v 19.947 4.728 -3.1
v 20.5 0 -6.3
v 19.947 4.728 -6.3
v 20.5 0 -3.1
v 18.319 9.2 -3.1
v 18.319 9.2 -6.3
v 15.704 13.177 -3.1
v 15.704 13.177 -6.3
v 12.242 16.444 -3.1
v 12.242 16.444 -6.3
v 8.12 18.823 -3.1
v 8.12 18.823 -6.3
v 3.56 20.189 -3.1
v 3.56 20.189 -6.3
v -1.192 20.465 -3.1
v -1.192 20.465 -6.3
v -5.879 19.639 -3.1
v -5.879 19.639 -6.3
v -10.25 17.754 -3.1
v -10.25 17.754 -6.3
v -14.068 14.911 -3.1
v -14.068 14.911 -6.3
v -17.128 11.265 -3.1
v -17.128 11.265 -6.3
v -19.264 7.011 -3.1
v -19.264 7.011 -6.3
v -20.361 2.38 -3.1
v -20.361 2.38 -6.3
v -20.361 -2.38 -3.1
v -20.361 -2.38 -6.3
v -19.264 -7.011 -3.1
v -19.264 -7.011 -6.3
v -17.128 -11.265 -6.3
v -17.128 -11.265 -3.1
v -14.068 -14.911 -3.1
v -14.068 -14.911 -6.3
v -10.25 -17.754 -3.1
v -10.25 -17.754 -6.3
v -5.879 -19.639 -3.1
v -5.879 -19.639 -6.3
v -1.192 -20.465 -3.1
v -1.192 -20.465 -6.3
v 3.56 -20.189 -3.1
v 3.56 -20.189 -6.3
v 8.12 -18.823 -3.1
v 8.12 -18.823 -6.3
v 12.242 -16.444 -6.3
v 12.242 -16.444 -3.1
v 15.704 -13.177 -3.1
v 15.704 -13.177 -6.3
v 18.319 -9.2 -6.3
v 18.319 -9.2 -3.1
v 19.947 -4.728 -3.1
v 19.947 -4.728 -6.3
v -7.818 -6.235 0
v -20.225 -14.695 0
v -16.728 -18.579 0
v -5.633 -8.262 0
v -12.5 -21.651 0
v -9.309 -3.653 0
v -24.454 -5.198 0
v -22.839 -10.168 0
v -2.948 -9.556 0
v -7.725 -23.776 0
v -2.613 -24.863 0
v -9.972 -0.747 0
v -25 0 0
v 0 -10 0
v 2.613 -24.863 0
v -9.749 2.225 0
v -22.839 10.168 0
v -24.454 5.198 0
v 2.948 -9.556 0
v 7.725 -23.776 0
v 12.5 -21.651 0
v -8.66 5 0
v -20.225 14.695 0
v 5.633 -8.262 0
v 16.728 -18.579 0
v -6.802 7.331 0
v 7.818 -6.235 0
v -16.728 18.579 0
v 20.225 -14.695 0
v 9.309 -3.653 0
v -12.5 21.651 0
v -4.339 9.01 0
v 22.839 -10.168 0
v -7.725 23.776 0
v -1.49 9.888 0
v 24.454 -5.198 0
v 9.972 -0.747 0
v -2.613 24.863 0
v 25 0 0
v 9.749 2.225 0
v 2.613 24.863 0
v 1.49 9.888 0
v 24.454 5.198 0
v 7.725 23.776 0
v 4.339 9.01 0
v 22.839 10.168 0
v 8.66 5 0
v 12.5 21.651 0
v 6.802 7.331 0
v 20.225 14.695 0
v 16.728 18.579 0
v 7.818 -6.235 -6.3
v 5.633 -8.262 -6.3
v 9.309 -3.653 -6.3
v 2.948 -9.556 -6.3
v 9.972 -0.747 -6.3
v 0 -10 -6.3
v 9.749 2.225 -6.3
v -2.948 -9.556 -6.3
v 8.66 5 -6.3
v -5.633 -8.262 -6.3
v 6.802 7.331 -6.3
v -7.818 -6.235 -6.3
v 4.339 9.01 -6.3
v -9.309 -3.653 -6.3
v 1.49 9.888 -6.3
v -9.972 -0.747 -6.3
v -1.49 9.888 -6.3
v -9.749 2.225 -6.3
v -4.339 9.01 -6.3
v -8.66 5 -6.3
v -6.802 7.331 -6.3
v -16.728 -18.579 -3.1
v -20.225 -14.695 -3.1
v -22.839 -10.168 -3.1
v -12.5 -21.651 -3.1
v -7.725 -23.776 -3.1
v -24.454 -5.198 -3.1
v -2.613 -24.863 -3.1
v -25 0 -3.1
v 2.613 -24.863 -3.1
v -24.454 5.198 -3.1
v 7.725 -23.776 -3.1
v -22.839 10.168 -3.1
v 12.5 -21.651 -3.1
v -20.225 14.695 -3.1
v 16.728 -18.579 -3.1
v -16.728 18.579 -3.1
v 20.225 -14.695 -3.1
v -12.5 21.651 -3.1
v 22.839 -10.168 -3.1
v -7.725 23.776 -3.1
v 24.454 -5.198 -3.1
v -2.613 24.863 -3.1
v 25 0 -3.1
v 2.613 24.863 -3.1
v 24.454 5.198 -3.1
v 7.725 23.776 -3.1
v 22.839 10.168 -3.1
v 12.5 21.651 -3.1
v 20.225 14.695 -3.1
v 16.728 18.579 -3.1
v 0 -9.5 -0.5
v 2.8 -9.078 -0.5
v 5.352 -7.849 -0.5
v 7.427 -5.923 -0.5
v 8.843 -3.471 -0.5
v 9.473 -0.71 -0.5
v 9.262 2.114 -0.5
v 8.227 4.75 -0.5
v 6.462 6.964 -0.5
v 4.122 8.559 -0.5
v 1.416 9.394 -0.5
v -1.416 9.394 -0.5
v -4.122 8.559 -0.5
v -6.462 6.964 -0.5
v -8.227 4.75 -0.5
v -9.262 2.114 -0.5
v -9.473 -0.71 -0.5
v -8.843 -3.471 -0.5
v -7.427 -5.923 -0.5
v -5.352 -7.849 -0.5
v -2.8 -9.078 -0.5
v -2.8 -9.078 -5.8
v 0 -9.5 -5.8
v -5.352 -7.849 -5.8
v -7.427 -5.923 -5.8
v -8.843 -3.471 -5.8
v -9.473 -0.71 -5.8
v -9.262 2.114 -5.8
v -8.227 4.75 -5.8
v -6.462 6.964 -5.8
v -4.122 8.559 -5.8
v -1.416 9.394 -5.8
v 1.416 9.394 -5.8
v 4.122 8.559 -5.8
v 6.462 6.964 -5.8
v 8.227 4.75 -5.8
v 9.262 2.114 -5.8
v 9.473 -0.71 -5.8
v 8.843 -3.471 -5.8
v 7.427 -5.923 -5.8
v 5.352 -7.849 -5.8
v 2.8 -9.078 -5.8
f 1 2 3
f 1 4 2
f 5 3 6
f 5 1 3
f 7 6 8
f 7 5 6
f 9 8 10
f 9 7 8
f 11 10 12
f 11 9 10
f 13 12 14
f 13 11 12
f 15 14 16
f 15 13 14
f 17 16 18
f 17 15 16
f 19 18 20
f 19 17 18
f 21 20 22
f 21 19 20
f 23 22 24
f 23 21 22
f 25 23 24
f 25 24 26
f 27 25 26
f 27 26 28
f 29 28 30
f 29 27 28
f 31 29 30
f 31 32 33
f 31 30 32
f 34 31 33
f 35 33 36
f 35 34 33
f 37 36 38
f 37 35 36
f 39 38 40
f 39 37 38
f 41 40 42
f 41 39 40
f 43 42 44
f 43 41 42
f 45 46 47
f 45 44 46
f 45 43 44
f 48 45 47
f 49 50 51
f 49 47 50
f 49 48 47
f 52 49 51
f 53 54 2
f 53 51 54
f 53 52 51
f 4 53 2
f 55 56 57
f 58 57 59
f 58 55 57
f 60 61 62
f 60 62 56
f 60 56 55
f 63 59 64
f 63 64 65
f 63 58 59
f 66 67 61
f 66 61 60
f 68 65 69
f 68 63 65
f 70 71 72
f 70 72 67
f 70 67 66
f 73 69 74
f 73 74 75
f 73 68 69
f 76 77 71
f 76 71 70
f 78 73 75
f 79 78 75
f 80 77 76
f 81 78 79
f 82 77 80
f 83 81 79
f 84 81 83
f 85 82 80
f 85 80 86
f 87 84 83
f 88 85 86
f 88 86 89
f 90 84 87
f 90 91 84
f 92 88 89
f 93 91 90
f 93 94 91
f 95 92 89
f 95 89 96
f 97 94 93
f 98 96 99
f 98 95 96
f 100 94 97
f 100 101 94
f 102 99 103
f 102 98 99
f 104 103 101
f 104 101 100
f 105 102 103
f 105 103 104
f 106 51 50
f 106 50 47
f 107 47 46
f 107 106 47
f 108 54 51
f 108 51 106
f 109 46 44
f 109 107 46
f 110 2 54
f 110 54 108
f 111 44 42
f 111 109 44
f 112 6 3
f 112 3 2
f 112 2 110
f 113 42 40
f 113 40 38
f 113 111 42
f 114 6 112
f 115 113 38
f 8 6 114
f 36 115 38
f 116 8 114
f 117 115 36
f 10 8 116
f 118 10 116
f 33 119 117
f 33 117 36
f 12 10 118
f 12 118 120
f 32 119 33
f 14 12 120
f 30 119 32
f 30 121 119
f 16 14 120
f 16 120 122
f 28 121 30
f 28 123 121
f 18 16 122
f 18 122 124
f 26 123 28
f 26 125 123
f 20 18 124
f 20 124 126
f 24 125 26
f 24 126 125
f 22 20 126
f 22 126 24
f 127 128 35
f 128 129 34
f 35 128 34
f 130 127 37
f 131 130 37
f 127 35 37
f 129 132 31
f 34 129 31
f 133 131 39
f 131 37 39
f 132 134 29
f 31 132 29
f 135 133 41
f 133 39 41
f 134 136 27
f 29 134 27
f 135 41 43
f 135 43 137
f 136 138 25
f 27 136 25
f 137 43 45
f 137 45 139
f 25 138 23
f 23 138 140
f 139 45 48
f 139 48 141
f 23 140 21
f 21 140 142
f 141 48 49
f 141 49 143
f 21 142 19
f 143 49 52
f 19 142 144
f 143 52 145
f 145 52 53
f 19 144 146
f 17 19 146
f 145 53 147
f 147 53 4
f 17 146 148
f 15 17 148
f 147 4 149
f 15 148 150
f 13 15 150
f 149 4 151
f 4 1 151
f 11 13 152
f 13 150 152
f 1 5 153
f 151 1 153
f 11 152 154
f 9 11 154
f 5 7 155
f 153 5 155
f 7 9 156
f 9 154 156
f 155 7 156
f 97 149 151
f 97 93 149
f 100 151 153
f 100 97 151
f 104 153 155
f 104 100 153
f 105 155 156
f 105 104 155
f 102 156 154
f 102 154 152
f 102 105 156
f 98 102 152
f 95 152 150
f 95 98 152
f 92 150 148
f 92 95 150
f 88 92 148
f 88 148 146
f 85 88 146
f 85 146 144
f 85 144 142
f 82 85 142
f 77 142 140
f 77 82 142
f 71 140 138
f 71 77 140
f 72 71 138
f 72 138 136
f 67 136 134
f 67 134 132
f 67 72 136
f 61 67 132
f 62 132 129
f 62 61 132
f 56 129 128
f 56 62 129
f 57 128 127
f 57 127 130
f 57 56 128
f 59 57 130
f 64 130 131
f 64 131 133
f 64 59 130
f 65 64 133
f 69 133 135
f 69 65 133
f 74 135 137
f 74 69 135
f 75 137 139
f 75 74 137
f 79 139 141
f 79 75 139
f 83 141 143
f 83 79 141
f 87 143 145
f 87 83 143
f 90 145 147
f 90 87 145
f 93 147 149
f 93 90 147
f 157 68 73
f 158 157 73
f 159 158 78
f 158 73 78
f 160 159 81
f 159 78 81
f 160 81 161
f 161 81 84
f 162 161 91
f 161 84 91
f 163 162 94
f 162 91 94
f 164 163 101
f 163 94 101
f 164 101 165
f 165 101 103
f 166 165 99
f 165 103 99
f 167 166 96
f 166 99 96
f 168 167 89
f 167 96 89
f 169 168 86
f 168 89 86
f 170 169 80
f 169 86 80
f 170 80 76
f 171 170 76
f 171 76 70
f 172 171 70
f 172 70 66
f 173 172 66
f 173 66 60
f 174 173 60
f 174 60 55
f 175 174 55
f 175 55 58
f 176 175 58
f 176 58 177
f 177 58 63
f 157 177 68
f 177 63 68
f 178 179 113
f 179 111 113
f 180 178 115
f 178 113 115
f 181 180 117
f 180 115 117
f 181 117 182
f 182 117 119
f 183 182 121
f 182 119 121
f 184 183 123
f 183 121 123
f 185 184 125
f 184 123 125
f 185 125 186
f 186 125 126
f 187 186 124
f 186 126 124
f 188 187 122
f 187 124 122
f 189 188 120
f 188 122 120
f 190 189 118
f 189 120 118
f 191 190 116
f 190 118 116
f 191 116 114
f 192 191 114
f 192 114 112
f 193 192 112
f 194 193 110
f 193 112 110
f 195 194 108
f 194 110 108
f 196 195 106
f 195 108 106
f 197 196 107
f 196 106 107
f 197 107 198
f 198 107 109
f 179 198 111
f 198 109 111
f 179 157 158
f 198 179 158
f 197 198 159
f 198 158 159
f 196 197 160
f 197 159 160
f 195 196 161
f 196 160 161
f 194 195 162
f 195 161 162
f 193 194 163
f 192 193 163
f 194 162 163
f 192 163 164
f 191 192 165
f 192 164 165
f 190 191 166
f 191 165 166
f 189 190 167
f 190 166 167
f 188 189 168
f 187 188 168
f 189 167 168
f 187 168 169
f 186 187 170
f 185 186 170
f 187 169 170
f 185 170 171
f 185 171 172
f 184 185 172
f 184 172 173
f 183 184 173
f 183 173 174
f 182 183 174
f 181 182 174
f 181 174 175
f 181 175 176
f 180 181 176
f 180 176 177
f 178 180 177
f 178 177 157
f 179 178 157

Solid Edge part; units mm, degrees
sketch "Sketch1" plane through (0, 0, 0) normal (0, 0, 1) x (1, 0, 0)
  circle A0 centre (0, 0) radius 25
extrude "Protrusion1" add sketch "Sketch1" against normal blind 3.1
sketch "Sketch2" plane through (0, 0, -3.1) normal (0, 0, -1) x (1, 0, 0)
  circle A0 centre (0, 0) radius 20.5
extrude "Protrusion2" add sketch "Sketch2" along normal blind 3.2
hole "Hole1" at (0, 0, 0) direction (0, 0, -1) diameter 19 end up to next
chamfer "Chamfer1" distance 0.5 angle 45 2 edges at (-9.5, 0, -6.3) (-9.5, 0, 0)
properties part number "75356"
